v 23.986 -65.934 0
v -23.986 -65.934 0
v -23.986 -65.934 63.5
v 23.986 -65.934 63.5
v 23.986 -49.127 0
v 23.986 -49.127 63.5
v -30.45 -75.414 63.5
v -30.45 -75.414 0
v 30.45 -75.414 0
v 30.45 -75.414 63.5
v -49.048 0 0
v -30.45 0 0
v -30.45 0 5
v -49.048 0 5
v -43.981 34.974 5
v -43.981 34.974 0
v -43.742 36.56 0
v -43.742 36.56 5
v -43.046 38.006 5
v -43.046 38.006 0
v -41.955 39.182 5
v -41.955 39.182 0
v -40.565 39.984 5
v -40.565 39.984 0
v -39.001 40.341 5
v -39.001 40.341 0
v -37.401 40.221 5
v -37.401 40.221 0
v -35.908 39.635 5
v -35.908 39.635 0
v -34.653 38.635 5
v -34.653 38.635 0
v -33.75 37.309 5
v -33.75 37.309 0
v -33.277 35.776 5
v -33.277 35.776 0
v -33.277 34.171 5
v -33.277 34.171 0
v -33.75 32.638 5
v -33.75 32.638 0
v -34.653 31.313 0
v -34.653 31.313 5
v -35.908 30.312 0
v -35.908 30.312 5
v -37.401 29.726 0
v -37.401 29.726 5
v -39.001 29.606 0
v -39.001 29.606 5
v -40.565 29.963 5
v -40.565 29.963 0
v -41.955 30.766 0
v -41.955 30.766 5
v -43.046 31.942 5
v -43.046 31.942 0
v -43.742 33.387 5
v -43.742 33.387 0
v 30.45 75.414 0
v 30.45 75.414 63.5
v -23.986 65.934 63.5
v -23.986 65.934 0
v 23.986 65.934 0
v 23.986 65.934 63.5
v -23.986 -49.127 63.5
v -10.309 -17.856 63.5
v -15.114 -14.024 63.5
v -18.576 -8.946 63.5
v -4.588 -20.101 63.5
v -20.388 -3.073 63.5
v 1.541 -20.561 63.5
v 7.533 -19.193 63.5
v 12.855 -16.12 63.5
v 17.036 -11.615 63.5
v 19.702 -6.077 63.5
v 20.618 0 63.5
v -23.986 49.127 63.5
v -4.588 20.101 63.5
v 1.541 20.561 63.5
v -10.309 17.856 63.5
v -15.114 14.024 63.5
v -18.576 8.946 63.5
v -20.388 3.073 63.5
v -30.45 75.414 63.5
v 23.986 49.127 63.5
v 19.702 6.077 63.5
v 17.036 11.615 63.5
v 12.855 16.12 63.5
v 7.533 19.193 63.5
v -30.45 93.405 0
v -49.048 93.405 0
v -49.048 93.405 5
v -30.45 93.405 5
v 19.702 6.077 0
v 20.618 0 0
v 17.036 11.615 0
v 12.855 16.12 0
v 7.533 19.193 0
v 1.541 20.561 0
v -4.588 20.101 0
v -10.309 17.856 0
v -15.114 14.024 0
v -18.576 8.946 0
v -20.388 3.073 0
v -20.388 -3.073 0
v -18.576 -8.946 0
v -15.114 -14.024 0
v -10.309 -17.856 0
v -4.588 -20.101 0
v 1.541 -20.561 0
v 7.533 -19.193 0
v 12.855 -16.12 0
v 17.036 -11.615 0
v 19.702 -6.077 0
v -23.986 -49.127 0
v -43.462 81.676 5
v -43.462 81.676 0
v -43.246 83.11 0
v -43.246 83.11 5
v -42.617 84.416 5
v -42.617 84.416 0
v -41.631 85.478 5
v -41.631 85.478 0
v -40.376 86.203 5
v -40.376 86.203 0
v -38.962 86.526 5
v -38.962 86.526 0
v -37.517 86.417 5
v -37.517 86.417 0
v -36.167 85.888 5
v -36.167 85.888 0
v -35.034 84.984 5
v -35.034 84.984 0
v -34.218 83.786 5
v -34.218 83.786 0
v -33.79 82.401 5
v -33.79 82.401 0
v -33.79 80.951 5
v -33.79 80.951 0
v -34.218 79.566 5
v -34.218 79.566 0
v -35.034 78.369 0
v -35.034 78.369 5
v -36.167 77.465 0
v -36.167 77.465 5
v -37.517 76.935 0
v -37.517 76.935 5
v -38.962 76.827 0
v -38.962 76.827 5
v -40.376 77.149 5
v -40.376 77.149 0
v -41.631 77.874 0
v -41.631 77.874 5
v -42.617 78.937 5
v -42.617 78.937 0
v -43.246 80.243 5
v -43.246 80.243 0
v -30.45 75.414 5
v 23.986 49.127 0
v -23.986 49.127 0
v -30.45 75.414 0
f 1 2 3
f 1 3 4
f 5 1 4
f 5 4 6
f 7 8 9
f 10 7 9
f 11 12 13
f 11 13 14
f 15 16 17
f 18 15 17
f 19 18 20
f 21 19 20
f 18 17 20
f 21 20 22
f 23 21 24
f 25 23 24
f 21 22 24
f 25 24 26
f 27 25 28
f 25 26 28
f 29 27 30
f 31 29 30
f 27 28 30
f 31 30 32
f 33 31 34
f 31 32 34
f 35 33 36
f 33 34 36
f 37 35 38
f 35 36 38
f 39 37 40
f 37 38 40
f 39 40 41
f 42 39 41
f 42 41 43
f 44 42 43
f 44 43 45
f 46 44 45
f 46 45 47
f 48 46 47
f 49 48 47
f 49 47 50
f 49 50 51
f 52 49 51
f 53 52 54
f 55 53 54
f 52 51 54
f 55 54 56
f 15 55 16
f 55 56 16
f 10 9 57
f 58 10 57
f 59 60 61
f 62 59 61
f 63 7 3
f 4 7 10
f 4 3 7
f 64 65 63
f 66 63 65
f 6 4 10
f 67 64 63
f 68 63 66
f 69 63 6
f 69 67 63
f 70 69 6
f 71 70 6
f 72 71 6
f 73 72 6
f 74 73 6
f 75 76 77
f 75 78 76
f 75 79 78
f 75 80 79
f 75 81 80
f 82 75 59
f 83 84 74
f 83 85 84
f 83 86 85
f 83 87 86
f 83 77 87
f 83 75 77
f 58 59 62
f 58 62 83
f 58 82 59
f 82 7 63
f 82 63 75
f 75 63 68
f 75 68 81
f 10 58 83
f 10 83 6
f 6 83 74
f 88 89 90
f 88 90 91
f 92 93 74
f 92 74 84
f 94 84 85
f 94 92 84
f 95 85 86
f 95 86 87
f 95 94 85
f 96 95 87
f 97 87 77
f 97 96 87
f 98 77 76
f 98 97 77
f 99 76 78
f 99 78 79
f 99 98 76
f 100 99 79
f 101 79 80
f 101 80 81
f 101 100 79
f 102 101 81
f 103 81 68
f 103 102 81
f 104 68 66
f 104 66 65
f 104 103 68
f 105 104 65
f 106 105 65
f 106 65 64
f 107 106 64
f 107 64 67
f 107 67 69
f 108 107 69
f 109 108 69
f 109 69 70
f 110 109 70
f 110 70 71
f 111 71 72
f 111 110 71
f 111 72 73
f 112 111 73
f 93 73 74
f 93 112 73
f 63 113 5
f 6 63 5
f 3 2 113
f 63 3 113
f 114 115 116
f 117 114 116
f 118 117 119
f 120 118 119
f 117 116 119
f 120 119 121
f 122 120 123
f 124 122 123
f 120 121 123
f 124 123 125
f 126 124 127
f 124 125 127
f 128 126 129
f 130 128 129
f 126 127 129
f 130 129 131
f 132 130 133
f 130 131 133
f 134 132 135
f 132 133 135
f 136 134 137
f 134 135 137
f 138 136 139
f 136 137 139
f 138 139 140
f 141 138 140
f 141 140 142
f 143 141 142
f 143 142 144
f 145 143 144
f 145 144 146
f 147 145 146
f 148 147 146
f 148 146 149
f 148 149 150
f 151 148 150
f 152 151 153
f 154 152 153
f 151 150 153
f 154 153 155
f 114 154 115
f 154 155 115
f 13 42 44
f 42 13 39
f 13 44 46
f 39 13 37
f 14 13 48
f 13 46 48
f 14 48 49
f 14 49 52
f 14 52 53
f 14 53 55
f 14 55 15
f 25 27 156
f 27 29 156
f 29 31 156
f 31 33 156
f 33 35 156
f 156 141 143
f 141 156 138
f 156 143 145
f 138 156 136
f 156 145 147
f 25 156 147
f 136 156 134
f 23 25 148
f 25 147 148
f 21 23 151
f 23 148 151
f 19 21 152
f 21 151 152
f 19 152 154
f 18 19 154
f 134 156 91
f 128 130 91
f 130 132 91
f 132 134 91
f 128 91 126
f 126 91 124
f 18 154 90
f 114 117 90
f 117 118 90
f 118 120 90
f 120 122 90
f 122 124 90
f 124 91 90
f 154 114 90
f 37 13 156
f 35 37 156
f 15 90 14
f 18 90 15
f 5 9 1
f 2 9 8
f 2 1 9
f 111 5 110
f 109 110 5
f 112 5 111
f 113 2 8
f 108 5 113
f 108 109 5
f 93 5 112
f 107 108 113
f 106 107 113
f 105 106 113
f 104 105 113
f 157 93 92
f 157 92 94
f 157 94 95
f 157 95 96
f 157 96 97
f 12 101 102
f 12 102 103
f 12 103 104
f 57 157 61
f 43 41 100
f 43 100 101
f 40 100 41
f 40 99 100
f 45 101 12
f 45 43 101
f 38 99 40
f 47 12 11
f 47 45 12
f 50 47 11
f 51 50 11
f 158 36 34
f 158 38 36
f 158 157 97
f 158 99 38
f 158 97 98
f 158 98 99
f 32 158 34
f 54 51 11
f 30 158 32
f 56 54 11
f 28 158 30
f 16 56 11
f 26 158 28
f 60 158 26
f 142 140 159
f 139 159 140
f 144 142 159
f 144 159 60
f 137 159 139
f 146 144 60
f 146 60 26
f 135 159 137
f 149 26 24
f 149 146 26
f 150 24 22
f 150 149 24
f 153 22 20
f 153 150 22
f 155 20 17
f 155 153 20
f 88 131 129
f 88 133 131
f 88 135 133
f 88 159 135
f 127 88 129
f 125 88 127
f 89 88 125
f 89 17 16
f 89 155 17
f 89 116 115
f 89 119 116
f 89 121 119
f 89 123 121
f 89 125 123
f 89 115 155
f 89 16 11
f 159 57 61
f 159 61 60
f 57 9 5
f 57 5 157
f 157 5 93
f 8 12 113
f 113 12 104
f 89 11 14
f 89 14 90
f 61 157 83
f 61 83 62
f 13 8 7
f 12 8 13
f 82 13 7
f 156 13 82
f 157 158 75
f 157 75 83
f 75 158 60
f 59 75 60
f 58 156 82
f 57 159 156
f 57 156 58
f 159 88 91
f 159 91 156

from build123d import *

# Parameters (mm, degrees)
SKETCH1_W           = 60.900023998
SKETCH1_H           = 150.828343314
SKETCH1_R           = 20.618232522
SKETCH1_W_2         = 47.971880286
SKETCH1_H_2         = 16.806586826
BOSS_EXTRUDE1_DEPTH = 63.5
SKETCH2_R           = 5.382285962
SKETCH2_R_2         = 4.862937902
BOSS_EXTRUDE2_DEPTH = 5


with BuildPart() as part:
    # Sketch1 → Boss-Extrude1 (new body)
    with BuildSketch(Plane.XY):
        Rectangle(SKETCH1_W, SKETCH1_H)
        Circle(SKETCH1_R, mode=Mode.SUBTRACT)
        with Locations((0, -57.530239521)):
            Rectangle(SKETCH1_W_2, SKETCH1_H_2, mode=Mode.SUBTRACT)
        with Locations((0, 57.530239521)):
            Rectangle(SKETCH1_W_2, SKETCH1_H_2, mode=Mode.SUBTRACT)
    extrude(amount=BOSS_EXTRUDE1_DEPTH)

    # Sketch2 → Boss-Extrude2 (add)
    with BuildSketch(Plane(origin=(0, 0, 0), x_dir=(-1, 0, 0), z_dir=(0, 0, -1))):
        Polygon((30.450011999, 93.405223195), (30.450011999, 75.414171657), (30.450011999, 0), (49.048404874, 0), (49.048404874, 93.405223195), align=None)
        with Locations((38.598962097, 34.973645215)):
            Circle(SKETCH2_R, mode=Mode.SUBTRACT)
        with Locations((38.598962097, 81.676256812)):
            Circle(SKETCH2_R_2, mode=Mode.SUBTRACT)
    extrude(amount=-BOSS_EXTRUDE2_DEPTH)


solid = part.part
